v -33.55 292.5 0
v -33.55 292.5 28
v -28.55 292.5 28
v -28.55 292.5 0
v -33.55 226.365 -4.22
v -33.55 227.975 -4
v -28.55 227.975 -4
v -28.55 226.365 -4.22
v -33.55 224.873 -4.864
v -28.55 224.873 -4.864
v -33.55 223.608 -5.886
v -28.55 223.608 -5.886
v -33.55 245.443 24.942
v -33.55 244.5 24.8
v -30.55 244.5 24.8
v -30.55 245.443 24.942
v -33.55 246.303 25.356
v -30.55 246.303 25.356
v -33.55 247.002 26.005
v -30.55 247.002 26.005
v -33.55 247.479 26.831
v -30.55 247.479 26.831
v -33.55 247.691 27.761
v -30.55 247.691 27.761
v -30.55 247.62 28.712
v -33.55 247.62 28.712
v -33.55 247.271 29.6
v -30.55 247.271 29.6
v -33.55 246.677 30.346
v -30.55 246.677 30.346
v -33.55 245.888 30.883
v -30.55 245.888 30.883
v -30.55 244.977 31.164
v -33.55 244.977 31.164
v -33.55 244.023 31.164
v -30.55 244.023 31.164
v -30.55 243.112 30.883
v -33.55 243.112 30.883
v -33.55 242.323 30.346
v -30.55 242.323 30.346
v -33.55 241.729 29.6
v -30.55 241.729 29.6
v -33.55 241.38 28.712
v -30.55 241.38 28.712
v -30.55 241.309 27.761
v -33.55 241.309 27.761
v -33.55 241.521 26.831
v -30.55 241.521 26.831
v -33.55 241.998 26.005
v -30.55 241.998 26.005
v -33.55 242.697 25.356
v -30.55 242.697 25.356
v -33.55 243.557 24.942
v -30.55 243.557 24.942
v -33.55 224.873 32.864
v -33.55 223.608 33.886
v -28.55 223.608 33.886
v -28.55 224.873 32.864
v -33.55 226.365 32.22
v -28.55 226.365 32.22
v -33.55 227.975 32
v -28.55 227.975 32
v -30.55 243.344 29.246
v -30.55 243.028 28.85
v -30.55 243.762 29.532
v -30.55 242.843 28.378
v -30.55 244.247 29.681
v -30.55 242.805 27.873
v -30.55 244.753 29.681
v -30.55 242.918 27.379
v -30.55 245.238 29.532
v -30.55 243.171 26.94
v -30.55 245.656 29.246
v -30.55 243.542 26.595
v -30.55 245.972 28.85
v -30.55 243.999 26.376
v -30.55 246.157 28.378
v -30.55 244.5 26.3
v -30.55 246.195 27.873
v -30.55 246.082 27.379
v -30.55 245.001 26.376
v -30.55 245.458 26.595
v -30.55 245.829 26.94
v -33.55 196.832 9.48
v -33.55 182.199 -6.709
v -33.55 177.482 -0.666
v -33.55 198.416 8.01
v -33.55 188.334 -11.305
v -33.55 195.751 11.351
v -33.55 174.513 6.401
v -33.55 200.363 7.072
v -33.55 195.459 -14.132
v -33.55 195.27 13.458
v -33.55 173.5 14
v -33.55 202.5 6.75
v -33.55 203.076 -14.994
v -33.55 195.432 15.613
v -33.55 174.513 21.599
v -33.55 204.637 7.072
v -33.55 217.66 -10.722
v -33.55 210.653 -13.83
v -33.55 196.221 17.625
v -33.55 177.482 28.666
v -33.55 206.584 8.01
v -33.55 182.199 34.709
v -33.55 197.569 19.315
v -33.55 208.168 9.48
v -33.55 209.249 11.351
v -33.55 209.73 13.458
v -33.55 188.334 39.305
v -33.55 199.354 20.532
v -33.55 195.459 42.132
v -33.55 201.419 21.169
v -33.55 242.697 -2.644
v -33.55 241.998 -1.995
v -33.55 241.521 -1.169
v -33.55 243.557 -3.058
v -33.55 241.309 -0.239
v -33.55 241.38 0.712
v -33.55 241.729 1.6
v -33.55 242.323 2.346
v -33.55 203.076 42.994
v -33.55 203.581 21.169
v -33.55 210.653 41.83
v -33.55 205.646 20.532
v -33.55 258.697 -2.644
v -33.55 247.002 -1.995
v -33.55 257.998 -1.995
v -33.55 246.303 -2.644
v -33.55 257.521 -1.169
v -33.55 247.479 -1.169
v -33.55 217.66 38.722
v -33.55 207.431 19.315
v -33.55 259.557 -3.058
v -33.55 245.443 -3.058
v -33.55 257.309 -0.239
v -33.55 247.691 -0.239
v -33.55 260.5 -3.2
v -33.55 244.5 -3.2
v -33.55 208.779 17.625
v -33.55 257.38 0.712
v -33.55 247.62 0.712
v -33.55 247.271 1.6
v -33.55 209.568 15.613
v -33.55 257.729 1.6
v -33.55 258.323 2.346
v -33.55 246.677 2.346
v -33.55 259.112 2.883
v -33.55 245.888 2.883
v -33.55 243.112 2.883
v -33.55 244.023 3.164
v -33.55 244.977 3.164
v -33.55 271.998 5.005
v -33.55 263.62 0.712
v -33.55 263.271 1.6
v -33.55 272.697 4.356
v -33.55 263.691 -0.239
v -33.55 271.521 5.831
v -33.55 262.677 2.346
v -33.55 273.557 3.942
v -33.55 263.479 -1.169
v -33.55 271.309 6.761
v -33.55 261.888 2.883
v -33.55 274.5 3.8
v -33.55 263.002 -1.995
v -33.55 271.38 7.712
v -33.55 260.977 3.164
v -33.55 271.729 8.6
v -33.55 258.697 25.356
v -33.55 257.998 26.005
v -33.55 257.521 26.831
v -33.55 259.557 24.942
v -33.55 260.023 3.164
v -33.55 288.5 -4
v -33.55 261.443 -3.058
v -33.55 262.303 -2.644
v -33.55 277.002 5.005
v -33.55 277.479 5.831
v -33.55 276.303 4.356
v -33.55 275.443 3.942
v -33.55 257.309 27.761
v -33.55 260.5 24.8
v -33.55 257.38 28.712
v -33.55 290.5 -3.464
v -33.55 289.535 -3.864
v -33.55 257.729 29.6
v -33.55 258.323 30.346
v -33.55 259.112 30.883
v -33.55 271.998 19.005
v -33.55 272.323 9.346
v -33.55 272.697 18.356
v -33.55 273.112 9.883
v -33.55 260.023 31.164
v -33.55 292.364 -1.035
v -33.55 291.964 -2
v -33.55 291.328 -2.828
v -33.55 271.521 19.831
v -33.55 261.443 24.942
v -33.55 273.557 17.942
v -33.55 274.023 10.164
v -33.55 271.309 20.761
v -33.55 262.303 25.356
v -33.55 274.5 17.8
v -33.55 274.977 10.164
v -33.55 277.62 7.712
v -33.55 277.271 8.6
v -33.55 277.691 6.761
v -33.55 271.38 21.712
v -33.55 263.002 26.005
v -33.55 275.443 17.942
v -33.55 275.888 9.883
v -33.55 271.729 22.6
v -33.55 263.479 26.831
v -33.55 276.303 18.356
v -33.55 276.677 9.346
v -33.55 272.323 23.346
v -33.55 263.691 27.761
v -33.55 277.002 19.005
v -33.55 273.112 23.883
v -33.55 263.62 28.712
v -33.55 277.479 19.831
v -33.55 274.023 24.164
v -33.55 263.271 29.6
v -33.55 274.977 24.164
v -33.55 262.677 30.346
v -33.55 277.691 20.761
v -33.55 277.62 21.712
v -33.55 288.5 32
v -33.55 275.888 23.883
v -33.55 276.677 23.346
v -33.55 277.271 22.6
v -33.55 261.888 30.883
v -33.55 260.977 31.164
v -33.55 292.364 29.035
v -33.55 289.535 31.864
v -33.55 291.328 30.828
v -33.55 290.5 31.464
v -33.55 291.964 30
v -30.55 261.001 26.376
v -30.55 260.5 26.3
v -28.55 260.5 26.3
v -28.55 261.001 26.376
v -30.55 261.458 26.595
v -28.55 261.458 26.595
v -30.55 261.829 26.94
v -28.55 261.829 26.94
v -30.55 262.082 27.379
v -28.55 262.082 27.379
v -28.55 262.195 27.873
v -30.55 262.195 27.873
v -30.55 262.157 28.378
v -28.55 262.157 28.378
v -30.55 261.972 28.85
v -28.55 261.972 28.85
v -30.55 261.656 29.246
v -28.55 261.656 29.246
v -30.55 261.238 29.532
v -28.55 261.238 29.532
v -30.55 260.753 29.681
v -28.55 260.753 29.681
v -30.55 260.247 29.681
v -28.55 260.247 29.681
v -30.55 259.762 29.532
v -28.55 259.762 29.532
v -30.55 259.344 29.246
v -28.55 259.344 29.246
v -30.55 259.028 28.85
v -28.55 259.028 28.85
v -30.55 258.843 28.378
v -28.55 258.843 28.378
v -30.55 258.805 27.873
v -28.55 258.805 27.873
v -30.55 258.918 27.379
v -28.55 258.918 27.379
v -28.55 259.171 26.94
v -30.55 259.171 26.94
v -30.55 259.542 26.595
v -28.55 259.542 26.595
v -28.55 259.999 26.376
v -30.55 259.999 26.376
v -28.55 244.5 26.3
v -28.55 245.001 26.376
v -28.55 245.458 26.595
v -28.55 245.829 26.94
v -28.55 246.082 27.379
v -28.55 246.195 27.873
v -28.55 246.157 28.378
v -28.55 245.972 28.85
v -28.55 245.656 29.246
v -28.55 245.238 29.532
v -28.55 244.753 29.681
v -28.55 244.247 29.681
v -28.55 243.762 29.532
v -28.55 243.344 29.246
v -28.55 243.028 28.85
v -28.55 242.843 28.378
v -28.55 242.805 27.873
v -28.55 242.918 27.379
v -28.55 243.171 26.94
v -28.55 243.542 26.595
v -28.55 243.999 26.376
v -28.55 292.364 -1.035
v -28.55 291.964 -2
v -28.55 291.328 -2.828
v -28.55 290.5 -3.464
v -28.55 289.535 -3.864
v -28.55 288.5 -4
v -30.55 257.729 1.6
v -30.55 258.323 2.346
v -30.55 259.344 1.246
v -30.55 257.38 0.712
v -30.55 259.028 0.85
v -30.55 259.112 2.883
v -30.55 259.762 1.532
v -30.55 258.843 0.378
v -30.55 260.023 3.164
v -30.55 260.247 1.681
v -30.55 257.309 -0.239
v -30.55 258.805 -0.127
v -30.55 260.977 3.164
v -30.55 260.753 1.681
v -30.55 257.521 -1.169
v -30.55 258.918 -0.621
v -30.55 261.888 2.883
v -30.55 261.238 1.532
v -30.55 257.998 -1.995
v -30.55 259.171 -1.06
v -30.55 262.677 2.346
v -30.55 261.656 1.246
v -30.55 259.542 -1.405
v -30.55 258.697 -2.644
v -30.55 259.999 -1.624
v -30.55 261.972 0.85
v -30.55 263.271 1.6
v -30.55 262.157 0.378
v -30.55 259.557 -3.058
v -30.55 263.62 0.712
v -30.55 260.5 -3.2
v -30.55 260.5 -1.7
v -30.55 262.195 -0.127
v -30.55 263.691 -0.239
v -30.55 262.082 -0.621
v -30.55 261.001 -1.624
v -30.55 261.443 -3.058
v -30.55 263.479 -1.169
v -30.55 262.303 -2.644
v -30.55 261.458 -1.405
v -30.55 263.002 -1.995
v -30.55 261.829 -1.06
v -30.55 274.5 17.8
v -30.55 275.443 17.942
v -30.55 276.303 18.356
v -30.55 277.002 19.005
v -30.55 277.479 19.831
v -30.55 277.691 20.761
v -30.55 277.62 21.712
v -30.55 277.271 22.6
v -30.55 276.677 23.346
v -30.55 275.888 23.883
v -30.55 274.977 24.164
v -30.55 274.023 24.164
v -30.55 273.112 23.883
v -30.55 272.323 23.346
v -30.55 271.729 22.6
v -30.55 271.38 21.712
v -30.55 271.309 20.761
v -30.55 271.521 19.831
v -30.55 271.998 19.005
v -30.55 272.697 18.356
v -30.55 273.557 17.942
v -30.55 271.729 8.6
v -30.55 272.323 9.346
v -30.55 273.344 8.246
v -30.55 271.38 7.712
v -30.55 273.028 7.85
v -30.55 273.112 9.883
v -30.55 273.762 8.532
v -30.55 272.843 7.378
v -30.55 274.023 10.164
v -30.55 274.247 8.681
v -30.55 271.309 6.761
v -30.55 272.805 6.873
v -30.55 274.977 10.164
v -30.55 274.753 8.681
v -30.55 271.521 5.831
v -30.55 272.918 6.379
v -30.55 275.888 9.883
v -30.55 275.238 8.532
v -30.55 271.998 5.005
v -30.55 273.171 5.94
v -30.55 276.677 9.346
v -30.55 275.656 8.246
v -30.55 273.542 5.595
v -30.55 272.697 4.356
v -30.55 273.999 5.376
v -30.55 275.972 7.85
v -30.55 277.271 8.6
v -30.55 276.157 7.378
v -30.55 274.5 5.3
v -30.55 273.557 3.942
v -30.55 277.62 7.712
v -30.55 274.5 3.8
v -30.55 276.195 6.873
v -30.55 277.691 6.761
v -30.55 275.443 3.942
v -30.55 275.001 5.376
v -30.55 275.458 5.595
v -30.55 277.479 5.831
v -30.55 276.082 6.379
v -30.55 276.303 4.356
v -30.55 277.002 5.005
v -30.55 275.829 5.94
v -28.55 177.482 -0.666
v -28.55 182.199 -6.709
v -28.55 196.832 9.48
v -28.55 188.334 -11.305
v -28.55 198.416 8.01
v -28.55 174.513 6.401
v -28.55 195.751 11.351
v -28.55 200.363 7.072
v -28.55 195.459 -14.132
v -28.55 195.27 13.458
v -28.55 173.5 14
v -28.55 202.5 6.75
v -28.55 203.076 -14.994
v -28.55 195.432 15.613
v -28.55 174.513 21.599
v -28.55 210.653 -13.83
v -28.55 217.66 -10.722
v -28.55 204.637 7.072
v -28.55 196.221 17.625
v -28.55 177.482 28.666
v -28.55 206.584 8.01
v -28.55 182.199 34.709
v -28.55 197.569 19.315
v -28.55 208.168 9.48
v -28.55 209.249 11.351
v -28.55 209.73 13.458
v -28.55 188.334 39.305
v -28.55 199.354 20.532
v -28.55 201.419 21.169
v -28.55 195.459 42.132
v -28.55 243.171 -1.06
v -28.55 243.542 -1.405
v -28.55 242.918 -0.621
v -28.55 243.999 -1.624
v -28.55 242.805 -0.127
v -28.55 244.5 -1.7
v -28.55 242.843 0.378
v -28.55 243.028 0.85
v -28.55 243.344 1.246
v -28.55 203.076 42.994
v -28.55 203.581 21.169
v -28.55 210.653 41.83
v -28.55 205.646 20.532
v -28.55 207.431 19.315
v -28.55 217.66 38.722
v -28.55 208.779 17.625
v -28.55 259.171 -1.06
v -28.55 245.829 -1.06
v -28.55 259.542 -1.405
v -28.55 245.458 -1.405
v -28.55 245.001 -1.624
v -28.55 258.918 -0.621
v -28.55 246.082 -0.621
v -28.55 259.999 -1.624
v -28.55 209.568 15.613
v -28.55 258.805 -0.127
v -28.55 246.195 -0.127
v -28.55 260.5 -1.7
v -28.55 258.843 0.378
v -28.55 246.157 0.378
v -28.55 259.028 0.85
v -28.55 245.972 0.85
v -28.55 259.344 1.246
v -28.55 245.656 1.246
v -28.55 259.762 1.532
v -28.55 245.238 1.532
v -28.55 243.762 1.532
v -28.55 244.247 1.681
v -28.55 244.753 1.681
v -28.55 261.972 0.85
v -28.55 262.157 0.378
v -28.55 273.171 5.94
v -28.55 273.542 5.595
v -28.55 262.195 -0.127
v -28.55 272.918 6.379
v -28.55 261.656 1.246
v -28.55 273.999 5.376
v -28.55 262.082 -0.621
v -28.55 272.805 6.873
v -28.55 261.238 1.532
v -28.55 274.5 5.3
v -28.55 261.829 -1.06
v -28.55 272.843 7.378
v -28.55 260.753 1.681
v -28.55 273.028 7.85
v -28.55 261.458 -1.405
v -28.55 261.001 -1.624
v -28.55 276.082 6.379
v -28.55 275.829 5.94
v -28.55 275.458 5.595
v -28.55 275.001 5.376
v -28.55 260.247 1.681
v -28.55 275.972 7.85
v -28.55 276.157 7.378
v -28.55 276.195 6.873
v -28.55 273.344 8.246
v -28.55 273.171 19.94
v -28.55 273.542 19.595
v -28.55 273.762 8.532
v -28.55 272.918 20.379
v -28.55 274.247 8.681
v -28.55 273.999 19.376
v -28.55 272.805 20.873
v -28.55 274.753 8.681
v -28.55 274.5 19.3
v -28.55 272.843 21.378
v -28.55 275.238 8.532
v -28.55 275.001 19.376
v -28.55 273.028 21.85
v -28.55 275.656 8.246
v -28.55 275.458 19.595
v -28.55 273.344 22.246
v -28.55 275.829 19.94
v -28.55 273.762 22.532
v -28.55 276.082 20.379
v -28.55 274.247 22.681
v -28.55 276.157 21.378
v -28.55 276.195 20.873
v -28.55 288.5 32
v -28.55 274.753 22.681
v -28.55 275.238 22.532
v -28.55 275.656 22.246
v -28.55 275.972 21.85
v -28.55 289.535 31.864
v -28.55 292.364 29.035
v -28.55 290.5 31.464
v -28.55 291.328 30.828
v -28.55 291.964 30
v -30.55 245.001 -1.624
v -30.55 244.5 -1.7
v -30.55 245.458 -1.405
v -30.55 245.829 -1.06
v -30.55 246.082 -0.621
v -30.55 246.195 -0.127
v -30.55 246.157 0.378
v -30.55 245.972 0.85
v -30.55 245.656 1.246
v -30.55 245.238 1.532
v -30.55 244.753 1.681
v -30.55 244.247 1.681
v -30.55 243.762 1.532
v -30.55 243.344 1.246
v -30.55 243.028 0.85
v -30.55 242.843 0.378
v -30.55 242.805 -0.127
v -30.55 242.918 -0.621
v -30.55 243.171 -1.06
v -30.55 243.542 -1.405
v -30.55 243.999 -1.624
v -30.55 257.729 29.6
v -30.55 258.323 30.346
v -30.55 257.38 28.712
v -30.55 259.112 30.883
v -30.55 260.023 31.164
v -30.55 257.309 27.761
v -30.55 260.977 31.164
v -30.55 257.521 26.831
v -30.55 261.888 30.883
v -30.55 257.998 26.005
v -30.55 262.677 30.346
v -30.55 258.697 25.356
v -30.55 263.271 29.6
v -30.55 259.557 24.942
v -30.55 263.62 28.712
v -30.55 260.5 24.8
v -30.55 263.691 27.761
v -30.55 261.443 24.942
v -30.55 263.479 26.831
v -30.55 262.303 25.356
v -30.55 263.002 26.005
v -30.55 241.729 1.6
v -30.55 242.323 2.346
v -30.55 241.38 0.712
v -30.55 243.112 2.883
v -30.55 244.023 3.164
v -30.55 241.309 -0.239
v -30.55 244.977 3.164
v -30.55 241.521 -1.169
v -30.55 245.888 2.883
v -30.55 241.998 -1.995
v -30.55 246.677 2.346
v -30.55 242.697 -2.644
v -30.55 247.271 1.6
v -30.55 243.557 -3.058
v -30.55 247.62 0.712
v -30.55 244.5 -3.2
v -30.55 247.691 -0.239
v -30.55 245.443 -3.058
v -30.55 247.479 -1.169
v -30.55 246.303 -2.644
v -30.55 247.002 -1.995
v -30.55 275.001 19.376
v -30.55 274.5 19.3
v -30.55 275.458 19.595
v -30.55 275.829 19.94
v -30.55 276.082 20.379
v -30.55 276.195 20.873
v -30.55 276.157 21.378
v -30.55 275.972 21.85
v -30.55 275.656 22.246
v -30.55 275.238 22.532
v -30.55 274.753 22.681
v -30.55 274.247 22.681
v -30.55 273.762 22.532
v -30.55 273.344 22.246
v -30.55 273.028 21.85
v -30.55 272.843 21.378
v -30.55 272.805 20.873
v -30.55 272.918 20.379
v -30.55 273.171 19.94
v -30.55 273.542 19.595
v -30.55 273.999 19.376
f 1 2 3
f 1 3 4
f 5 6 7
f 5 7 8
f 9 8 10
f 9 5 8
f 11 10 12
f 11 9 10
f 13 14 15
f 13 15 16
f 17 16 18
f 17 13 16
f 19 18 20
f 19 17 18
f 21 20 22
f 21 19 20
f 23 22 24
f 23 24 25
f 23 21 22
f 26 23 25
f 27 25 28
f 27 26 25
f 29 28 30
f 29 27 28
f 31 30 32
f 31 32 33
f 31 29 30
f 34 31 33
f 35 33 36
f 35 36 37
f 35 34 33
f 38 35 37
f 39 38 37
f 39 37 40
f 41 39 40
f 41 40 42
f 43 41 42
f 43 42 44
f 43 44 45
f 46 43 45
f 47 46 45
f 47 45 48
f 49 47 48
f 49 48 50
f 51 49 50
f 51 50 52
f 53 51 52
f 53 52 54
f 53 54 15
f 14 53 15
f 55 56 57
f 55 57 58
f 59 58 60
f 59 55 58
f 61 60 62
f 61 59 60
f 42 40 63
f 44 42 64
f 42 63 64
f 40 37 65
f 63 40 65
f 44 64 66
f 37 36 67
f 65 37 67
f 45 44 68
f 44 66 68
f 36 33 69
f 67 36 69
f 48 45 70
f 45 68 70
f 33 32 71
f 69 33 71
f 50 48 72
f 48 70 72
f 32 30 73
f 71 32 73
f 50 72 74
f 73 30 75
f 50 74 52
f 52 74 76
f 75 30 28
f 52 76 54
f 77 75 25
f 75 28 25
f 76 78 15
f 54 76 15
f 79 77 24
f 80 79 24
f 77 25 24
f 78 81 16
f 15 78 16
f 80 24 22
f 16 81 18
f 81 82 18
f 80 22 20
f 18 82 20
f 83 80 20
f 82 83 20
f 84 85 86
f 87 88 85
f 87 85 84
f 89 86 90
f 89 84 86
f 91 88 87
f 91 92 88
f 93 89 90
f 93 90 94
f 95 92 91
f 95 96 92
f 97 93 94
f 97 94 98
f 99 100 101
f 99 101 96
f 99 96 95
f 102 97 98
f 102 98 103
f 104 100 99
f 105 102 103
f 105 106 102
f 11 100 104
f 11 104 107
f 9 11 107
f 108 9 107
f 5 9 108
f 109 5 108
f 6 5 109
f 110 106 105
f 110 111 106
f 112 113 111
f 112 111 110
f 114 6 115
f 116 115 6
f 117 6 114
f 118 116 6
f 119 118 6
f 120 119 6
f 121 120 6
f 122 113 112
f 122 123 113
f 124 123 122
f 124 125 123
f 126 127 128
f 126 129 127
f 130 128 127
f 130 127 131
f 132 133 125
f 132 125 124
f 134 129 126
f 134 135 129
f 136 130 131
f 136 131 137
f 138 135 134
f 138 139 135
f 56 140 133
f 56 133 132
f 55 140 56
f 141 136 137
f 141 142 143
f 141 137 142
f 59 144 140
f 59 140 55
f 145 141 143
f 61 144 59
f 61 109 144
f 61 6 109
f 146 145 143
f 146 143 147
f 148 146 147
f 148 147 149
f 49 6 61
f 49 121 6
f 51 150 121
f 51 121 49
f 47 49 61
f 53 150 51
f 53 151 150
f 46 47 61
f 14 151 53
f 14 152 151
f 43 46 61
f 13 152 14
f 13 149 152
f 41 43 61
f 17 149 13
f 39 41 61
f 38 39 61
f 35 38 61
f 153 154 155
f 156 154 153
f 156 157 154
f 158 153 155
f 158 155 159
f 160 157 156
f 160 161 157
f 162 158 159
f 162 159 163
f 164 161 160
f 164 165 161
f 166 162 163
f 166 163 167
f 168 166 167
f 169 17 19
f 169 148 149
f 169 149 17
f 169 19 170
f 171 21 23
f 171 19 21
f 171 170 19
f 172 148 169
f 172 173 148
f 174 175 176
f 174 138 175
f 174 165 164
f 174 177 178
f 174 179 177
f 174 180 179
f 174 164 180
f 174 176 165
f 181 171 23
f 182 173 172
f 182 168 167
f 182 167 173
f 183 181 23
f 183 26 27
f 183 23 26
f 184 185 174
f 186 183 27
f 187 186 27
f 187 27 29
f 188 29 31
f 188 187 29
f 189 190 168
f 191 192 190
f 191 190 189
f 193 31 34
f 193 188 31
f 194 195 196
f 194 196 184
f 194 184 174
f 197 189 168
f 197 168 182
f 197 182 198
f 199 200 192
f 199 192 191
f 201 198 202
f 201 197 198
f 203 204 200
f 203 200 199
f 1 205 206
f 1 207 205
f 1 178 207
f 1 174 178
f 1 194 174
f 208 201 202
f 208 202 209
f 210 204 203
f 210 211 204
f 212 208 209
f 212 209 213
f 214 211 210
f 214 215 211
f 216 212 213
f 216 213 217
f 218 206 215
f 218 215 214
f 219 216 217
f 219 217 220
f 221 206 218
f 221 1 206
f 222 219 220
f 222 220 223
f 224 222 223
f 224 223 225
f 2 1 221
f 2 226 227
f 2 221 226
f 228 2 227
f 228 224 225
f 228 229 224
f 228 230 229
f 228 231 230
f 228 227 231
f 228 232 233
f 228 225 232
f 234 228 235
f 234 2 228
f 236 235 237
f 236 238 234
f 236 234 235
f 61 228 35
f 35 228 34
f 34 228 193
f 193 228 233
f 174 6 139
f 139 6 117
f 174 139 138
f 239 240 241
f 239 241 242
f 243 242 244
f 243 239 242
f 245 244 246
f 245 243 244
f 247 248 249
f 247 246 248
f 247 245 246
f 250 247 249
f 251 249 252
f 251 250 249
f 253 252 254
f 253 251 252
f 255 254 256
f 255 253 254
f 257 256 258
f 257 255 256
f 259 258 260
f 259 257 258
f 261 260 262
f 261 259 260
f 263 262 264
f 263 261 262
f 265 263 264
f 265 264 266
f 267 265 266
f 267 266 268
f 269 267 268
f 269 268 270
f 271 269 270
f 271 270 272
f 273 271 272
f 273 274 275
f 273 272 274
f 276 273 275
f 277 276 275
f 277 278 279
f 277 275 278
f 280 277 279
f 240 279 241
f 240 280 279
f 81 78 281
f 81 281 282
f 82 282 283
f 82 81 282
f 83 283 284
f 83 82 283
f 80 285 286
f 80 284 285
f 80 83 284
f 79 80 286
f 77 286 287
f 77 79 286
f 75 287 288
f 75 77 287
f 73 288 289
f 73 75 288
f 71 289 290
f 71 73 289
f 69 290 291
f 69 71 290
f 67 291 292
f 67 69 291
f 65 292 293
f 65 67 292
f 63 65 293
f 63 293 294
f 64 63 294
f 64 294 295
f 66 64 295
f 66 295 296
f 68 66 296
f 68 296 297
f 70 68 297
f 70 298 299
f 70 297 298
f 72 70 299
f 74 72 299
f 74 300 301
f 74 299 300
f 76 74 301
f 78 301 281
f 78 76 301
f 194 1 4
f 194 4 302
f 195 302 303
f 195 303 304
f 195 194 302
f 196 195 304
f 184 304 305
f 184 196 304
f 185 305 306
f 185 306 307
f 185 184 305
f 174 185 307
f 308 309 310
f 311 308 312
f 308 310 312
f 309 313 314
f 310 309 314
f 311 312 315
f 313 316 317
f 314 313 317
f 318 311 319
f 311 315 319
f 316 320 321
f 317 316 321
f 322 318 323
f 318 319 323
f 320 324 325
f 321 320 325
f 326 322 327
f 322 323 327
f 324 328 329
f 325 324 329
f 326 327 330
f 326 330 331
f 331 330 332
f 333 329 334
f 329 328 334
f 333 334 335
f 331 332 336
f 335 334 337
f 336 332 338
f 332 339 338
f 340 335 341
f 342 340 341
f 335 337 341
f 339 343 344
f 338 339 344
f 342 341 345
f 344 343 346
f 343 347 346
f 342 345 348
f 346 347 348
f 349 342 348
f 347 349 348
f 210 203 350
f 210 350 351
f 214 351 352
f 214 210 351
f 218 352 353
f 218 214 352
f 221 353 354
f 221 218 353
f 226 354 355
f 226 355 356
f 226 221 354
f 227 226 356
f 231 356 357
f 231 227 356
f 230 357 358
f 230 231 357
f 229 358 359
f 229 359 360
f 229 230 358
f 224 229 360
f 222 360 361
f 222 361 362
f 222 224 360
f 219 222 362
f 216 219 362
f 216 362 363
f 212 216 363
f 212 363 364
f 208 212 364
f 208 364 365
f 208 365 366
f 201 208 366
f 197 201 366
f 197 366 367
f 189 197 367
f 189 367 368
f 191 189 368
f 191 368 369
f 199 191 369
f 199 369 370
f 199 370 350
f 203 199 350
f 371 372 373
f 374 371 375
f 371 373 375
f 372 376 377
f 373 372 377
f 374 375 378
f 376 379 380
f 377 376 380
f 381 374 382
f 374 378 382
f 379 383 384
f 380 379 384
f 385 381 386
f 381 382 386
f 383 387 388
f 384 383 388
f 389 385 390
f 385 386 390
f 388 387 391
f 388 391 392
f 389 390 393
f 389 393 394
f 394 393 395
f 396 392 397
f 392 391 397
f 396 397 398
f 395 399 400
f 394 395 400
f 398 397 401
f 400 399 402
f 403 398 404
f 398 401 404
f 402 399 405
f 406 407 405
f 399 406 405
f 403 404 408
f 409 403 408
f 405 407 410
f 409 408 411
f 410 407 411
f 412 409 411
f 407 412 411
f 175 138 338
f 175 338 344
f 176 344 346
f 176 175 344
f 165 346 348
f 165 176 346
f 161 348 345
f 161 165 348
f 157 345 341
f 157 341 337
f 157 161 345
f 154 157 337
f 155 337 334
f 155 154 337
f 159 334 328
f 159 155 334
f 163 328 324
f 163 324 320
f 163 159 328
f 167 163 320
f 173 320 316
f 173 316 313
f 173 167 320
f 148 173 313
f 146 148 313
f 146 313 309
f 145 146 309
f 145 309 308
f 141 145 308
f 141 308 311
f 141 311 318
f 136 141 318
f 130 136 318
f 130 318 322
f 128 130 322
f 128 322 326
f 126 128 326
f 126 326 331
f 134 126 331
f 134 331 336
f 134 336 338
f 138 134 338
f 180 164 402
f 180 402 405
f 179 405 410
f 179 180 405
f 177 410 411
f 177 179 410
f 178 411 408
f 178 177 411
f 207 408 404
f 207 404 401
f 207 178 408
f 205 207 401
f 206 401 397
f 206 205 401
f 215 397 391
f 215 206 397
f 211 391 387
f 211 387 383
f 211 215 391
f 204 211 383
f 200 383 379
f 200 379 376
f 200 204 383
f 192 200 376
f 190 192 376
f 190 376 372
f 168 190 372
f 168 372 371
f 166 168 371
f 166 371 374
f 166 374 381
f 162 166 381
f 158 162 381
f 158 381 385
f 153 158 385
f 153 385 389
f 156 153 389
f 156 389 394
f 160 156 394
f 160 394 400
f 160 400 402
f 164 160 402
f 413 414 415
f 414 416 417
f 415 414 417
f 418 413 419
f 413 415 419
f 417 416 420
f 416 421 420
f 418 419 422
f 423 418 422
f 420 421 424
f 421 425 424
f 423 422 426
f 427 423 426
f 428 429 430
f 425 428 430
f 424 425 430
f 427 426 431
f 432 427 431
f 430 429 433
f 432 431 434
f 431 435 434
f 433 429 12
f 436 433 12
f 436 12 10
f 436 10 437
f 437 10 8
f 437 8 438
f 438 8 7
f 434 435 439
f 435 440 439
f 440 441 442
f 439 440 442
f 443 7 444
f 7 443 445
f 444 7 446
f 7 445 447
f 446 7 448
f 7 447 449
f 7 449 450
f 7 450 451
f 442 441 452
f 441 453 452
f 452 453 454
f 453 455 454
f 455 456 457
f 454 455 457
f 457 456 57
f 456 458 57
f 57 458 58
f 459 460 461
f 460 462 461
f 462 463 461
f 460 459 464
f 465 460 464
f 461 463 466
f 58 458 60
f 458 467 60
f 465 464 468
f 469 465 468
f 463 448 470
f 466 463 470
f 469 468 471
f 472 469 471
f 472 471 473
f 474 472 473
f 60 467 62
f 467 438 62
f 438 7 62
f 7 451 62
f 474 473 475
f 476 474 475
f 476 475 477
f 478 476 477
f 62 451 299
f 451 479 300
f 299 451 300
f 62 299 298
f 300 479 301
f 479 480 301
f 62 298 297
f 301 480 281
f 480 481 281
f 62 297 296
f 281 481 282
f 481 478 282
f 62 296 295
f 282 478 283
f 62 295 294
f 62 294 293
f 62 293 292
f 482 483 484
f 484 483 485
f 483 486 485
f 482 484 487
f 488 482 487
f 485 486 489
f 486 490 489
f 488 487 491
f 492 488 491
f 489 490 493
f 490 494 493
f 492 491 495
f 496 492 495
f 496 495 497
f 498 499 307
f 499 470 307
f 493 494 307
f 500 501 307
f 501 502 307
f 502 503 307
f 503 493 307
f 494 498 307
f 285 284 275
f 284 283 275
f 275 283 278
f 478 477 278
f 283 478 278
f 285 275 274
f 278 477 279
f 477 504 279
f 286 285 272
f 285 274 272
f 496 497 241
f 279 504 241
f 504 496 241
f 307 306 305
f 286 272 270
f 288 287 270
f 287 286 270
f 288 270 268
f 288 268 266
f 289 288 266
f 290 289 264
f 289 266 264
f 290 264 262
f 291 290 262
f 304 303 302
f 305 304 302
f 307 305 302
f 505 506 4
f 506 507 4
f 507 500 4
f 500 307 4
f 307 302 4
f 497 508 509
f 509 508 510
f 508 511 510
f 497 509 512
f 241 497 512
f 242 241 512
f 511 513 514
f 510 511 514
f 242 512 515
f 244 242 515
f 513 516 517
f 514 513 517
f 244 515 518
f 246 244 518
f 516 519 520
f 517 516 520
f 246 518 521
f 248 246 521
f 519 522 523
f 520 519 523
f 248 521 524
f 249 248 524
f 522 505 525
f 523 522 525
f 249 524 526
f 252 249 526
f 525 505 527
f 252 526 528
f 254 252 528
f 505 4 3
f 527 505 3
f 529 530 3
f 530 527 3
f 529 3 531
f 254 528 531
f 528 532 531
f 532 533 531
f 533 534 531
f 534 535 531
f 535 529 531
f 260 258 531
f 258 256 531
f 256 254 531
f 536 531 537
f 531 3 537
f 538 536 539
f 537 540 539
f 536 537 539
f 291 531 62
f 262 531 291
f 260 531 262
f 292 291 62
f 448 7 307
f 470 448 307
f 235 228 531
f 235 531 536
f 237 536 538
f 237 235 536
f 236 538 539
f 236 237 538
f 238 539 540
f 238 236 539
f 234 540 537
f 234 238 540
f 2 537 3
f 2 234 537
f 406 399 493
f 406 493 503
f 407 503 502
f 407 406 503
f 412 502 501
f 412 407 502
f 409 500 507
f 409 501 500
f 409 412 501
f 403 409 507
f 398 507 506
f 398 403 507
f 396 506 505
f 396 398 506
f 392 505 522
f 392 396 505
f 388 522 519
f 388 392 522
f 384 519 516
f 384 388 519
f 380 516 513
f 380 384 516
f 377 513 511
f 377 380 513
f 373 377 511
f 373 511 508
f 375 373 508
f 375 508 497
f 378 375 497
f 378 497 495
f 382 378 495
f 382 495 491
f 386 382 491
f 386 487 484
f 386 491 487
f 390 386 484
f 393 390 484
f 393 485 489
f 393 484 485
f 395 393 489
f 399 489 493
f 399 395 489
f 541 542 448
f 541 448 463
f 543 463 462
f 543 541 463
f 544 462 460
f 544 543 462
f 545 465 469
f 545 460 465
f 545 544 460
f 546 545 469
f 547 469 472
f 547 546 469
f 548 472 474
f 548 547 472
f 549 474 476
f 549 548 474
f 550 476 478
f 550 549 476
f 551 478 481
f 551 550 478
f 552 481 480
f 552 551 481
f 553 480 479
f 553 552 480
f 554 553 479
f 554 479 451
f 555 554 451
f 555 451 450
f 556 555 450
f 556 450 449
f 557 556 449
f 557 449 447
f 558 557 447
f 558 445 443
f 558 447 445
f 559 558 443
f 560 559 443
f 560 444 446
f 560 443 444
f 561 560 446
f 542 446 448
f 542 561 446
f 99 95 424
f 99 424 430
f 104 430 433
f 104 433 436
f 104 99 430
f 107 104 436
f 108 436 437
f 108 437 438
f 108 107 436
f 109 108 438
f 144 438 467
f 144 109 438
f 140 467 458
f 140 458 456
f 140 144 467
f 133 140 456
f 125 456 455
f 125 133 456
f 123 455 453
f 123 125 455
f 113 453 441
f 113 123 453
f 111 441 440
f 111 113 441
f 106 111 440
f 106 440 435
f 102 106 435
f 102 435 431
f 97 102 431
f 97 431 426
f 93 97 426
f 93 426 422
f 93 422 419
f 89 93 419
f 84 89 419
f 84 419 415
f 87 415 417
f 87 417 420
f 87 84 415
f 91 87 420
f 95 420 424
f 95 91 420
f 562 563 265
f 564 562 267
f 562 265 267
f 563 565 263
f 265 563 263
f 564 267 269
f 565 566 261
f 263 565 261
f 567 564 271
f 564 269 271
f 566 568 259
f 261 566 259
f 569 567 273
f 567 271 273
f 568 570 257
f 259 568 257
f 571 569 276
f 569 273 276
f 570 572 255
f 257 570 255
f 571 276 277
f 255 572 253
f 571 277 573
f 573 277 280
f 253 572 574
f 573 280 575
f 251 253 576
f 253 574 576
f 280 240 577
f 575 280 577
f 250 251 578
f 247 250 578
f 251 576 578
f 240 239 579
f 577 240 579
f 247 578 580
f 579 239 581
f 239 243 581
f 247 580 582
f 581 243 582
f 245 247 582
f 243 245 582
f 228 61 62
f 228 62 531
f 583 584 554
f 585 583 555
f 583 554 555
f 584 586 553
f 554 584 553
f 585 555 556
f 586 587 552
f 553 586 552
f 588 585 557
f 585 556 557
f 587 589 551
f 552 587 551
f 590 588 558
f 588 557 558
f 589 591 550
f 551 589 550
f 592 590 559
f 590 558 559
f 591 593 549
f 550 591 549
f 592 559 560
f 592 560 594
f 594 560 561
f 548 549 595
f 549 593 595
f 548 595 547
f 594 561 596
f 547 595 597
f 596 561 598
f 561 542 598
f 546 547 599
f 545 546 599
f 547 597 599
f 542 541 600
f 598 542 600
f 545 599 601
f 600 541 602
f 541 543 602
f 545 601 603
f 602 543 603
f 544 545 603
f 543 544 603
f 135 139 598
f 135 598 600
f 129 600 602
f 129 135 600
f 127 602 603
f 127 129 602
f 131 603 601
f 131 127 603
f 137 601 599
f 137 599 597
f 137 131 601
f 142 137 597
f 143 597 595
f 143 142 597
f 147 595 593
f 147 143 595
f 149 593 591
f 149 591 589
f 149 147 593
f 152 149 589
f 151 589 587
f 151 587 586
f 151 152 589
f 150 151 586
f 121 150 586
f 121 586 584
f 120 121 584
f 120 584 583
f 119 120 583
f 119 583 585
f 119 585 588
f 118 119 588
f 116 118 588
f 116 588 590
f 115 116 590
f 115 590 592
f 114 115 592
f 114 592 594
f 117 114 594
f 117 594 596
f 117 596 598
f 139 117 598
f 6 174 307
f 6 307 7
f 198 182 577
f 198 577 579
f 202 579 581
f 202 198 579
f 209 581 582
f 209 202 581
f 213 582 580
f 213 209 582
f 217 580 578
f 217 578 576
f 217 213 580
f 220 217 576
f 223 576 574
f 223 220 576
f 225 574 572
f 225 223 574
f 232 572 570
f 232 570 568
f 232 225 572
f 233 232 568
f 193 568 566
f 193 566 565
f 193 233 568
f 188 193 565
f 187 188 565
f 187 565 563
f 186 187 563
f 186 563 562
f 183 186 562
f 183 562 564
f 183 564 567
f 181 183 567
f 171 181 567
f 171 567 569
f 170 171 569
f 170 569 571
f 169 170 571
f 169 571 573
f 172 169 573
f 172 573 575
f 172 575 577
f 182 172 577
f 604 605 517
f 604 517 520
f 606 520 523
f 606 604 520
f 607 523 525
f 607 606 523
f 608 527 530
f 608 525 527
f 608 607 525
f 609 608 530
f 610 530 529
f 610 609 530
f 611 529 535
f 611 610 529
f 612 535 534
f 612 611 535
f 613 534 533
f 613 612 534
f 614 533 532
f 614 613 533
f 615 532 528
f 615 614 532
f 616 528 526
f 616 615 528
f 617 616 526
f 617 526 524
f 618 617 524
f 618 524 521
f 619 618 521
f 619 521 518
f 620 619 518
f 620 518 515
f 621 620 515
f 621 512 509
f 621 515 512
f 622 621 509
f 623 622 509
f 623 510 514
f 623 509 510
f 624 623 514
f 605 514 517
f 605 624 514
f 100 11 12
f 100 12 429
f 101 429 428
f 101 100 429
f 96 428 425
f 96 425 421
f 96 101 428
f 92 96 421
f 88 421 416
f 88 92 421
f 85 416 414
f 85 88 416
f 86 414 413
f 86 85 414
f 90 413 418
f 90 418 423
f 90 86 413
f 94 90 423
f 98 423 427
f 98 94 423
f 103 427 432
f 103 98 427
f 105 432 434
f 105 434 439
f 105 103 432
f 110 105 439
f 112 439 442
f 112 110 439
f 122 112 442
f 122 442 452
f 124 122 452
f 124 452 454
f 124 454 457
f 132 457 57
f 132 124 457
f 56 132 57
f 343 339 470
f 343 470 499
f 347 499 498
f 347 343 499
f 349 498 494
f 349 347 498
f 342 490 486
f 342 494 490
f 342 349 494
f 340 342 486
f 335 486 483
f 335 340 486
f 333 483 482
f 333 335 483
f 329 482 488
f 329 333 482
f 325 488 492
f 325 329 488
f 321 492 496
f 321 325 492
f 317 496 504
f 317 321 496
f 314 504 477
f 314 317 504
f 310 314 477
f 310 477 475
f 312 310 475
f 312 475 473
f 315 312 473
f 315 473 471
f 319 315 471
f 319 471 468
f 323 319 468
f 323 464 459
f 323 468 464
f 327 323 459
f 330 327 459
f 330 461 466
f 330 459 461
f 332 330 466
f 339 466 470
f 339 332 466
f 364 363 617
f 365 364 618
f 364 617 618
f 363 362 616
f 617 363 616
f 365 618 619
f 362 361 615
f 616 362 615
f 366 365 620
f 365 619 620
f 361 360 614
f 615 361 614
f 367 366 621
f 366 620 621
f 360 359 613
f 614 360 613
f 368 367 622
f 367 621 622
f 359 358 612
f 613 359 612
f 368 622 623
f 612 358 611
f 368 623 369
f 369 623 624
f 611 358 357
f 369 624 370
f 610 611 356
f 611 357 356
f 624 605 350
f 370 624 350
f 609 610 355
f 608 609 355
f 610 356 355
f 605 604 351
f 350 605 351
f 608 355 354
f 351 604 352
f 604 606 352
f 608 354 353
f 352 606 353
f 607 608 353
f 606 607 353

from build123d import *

# Parameters (mm, degrees)
PLATE_START        = -33.55
SKETCH1_R          = 7.25
PLATE_I_DEPTH      = 5
BOLT_START         = -33.75
SKETCH2_R          = 1.7
BOLT_HOLES_DEPTH   = 5.4
COUNTERBORES_START = -33.75
SKETCH3_R          = 3.2
COUNTERBORES_DEPTH = 3.2


with BuildPart() as part:
    # Sketch1 → Plate I (new body)
    with BuildSketch(Plane(origin=(0, 0, 0), x_dir=(0, 0, -1), z_dir=(1, 0, 0)).offset(PLATE_START)):
        with BuildLine():
            Line((-32, 227.975478406), (-32, 288.5))
            ThreePointArc((-32, 288.5), (-30.828427125, 291.328427125), (-28, 292.5))
            Line((-28, 292.5), (0, 292.5))
            ThreePointArc((0, 292.5), (2.828427125, 291.328427125), (4, 288.5))
            Line((4, 288.5), (4, 227.975478406))
            ThreePointArc((4, 227.975478406), (4.49156491, 225.597003504), (5.885714286, 223.608253536))
            ThreePointArc((5.885714286, 223.608253536), (-14, 173.5), (-33.885714286, 223.608253536))
            ThreePointArc((-33.885714286, 223.608253536), (-32.49156491, 225.597003504), (-32, 227.975478406))
        make_face()
        with Locations((-14, 202.5)):
            Circle(SKETCH1_R, mode=Mode.SUBTRACT)
    extrude(amount=PLATE_I_DEPTH)

    # Sketch2 → Bolt holes (cut)
    with BuildSketch(Plane(origin=(0, 0, 0), x_dir=(0, 0, -1), z_dir=(1, 0, 0)).offset(BOLT_START)):
        with Locations((0, 244.5)):
            Circle(SKETCH2_R)
        with Locations((-28, 244.5)):
            Circle(SKETCH2_R)
        with Locations((0, 260.5)):
            Circle(SKETCH2_R)
        with Locations((-28, 260.5)):
            Circle(SKETCH2_R)
        with Locations((-7, 274.5)):
            Circle(SKETCH2_R)
        with Locations((-21, 274.5)):
            Circle(SKETCH2_R)
    extrude(amount=BOLT_HOLES_DEPTH, mode=Mode.SUBTRACT)

    # Sketch3 → Counterbores (cut)
    with BuildSketch(Plane(origin=(0, 0, 0), x_dir=(0, 0, -1), z_dir=(1, 0, 0)).offset(COUNTERBORES_START)):
        with Locations((0, 244.5)):
            Circle(SKETCH3_R)
        with Locations((-28, 244.5)):
            Circle(SKETCH3_R)
        with Locations((0, 260.5)):
            Circle(SKETCH3_R)
        with Locations((-28, 260.5)):
            Circle(SKETCH3_R)
        with Locations((-7, 274.5)):
            Circle(SKETCH3_R)
        with Locations((-21, 274.5)):
            Circle(SKETCH3_R)
    extrude(amount=COUNTERBORES_DEPTH, mode=Mode.SUBTRACT)


solid = part.part
